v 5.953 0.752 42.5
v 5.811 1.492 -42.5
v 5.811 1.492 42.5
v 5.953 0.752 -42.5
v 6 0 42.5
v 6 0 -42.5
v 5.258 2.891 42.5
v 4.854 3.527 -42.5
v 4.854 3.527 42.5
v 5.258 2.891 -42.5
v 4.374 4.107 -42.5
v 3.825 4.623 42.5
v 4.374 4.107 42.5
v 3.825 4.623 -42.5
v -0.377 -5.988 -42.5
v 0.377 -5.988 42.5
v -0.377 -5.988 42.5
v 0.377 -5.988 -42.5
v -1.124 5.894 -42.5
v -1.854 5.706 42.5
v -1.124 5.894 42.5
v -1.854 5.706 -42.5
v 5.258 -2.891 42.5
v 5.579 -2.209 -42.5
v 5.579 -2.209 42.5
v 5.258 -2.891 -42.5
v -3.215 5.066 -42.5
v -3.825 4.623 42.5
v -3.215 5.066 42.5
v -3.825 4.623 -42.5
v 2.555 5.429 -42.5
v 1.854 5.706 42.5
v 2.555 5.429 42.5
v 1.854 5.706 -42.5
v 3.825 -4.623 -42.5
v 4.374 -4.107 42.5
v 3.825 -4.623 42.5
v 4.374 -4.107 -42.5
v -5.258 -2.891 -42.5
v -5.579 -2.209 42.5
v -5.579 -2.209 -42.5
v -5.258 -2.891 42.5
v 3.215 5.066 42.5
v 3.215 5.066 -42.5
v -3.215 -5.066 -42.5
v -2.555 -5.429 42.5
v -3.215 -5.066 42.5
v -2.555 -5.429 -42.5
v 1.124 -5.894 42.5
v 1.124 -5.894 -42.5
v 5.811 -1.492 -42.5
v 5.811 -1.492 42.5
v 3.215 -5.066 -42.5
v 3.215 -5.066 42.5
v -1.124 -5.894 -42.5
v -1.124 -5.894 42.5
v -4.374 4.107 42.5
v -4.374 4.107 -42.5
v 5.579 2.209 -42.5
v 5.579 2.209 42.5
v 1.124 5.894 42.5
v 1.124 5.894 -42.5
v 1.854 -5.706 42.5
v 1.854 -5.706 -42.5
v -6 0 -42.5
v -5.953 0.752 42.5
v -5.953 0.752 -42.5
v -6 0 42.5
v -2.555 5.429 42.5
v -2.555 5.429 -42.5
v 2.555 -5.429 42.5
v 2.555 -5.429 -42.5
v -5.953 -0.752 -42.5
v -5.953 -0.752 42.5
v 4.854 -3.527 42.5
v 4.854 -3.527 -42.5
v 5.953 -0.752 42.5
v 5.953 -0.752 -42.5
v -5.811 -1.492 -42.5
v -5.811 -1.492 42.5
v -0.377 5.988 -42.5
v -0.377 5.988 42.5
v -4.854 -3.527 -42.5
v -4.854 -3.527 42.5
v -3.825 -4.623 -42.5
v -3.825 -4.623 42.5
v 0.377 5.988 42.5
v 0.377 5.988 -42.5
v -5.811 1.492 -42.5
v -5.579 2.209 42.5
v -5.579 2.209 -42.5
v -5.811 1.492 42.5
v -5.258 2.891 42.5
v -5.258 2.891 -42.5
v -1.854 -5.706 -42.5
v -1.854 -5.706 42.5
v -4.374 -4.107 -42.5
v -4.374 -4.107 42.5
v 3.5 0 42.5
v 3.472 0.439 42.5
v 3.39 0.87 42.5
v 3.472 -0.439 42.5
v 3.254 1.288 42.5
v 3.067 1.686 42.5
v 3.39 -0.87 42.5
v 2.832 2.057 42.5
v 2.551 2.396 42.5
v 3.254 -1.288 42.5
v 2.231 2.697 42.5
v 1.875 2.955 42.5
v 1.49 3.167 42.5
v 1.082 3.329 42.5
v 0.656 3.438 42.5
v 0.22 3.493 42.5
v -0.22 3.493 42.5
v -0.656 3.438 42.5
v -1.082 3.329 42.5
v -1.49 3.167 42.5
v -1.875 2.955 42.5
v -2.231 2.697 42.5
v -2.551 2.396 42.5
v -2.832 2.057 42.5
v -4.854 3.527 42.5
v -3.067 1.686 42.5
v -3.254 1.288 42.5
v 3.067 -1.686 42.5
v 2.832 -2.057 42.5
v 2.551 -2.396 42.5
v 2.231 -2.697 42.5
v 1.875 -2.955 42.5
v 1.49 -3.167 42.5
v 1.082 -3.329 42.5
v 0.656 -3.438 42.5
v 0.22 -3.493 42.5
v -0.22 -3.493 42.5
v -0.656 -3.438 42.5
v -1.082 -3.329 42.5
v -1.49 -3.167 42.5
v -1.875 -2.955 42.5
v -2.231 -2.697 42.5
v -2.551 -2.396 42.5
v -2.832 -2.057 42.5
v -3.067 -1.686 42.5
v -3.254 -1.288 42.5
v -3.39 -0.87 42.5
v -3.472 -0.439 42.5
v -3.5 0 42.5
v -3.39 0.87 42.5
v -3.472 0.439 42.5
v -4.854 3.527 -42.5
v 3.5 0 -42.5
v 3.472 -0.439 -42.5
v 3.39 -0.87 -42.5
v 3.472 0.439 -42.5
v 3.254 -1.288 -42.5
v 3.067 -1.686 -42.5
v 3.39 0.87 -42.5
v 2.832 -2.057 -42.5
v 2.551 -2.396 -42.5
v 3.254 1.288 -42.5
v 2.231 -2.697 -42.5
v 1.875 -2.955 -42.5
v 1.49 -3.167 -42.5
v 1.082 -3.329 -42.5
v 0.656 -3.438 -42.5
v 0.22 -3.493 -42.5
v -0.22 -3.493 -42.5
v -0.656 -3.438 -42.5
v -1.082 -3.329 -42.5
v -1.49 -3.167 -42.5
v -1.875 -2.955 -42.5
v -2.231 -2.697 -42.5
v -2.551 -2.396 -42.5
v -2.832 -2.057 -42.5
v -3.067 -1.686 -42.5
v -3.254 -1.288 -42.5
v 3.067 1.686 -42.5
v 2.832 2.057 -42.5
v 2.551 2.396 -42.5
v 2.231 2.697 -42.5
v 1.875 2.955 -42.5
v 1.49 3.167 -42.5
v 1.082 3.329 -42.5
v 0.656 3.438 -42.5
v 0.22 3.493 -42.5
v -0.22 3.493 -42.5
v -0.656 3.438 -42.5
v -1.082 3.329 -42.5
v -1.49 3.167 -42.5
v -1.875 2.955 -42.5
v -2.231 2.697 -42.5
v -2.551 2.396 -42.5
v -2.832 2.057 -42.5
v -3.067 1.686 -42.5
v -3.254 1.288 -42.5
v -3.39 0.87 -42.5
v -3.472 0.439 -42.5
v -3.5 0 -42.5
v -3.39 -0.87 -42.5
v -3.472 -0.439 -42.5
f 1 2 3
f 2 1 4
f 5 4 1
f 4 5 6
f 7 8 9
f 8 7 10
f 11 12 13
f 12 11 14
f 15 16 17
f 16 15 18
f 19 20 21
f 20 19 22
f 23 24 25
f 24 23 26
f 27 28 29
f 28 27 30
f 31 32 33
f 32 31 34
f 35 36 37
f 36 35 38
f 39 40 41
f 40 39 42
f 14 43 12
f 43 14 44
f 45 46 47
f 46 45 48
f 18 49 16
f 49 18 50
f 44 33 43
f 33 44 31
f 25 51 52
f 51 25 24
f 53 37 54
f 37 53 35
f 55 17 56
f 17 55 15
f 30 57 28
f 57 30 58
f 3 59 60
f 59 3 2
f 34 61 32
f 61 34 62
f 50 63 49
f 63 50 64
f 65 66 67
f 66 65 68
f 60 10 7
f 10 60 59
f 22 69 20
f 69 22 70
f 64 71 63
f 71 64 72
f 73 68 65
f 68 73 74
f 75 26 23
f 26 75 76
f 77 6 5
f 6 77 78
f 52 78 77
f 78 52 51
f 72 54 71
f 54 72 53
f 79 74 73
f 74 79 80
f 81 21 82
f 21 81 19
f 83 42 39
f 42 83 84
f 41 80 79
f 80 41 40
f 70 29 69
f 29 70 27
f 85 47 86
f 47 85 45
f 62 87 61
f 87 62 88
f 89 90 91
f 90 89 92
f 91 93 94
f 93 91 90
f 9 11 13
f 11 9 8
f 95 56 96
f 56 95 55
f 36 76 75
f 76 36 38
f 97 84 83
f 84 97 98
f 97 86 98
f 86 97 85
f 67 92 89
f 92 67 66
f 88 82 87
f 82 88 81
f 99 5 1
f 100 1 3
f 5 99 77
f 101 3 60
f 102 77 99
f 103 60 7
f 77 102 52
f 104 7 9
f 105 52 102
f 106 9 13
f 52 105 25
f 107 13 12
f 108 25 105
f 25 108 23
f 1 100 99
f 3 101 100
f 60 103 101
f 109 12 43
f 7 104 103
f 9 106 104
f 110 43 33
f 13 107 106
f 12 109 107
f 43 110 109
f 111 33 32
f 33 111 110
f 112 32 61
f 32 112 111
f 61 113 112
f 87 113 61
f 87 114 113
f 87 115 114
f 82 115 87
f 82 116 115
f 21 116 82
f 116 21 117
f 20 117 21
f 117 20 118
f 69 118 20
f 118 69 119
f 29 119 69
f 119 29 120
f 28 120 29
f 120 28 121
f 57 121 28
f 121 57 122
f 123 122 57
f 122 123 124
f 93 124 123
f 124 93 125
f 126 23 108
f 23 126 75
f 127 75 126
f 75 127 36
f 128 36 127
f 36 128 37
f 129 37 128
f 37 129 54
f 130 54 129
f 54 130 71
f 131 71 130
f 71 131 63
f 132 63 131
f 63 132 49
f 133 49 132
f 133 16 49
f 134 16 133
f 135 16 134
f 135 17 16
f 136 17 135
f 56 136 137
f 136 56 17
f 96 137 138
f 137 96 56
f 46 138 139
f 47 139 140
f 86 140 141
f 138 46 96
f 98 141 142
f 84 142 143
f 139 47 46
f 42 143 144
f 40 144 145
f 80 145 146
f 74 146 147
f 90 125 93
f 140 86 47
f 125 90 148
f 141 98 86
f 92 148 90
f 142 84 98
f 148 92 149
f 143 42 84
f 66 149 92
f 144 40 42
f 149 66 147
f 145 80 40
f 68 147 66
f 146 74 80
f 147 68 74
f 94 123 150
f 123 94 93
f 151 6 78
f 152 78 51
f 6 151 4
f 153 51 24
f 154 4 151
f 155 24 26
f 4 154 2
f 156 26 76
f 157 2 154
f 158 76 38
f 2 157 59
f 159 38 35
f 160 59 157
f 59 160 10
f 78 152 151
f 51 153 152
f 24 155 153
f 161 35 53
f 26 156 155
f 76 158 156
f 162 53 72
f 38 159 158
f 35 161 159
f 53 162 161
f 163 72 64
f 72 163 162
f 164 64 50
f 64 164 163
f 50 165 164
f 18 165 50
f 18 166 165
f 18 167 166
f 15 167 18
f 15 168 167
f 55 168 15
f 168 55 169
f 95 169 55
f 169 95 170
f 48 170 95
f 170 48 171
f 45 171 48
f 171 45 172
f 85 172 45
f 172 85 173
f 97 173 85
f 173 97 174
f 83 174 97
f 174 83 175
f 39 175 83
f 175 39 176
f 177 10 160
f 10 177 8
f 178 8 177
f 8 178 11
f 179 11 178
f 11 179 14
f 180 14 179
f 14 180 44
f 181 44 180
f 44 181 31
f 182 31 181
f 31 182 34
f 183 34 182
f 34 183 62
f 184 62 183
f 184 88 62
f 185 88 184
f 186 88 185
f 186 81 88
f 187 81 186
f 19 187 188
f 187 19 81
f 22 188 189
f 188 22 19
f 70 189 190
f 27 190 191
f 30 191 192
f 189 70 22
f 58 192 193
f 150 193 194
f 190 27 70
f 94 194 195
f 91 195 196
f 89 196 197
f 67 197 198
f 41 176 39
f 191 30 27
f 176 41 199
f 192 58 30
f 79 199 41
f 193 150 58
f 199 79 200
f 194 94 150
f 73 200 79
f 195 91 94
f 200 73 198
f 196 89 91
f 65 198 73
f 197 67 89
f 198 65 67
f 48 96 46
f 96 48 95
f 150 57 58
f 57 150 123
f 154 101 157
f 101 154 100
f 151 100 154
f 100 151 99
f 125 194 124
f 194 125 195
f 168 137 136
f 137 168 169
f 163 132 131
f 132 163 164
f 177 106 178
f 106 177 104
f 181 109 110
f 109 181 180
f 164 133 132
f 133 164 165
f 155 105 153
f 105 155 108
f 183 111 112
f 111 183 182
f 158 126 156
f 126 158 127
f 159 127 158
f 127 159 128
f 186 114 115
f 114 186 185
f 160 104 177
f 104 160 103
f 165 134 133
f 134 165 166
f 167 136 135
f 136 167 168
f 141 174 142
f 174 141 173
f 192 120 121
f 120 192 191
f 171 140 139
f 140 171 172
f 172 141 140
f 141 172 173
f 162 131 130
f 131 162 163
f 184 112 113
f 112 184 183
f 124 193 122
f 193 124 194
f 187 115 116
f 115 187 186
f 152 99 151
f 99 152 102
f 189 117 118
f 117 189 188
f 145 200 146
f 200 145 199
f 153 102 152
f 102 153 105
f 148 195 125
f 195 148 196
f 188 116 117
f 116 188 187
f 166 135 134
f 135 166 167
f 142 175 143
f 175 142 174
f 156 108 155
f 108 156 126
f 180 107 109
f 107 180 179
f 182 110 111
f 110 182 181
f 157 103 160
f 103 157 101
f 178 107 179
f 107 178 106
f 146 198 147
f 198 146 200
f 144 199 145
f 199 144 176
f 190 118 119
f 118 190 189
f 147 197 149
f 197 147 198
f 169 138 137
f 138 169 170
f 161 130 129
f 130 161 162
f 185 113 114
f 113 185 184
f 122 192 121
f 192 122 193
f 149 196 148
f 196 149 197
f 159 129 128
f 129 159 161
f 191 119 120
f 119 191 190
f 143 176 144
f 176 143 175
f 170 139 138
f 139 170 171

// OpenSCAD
$fn = 50;


difference() {
	union() {
		translate(v = [0, 0, -42.5000000000]) {
			cylinder(h = 85, r = 6.0000000000);
		}
	}
	union() {
		translate(v = [0, 0, -100.0000000000]) {
			cylinder(h = 200, r = 3.5000000000);
		}
	}
}
